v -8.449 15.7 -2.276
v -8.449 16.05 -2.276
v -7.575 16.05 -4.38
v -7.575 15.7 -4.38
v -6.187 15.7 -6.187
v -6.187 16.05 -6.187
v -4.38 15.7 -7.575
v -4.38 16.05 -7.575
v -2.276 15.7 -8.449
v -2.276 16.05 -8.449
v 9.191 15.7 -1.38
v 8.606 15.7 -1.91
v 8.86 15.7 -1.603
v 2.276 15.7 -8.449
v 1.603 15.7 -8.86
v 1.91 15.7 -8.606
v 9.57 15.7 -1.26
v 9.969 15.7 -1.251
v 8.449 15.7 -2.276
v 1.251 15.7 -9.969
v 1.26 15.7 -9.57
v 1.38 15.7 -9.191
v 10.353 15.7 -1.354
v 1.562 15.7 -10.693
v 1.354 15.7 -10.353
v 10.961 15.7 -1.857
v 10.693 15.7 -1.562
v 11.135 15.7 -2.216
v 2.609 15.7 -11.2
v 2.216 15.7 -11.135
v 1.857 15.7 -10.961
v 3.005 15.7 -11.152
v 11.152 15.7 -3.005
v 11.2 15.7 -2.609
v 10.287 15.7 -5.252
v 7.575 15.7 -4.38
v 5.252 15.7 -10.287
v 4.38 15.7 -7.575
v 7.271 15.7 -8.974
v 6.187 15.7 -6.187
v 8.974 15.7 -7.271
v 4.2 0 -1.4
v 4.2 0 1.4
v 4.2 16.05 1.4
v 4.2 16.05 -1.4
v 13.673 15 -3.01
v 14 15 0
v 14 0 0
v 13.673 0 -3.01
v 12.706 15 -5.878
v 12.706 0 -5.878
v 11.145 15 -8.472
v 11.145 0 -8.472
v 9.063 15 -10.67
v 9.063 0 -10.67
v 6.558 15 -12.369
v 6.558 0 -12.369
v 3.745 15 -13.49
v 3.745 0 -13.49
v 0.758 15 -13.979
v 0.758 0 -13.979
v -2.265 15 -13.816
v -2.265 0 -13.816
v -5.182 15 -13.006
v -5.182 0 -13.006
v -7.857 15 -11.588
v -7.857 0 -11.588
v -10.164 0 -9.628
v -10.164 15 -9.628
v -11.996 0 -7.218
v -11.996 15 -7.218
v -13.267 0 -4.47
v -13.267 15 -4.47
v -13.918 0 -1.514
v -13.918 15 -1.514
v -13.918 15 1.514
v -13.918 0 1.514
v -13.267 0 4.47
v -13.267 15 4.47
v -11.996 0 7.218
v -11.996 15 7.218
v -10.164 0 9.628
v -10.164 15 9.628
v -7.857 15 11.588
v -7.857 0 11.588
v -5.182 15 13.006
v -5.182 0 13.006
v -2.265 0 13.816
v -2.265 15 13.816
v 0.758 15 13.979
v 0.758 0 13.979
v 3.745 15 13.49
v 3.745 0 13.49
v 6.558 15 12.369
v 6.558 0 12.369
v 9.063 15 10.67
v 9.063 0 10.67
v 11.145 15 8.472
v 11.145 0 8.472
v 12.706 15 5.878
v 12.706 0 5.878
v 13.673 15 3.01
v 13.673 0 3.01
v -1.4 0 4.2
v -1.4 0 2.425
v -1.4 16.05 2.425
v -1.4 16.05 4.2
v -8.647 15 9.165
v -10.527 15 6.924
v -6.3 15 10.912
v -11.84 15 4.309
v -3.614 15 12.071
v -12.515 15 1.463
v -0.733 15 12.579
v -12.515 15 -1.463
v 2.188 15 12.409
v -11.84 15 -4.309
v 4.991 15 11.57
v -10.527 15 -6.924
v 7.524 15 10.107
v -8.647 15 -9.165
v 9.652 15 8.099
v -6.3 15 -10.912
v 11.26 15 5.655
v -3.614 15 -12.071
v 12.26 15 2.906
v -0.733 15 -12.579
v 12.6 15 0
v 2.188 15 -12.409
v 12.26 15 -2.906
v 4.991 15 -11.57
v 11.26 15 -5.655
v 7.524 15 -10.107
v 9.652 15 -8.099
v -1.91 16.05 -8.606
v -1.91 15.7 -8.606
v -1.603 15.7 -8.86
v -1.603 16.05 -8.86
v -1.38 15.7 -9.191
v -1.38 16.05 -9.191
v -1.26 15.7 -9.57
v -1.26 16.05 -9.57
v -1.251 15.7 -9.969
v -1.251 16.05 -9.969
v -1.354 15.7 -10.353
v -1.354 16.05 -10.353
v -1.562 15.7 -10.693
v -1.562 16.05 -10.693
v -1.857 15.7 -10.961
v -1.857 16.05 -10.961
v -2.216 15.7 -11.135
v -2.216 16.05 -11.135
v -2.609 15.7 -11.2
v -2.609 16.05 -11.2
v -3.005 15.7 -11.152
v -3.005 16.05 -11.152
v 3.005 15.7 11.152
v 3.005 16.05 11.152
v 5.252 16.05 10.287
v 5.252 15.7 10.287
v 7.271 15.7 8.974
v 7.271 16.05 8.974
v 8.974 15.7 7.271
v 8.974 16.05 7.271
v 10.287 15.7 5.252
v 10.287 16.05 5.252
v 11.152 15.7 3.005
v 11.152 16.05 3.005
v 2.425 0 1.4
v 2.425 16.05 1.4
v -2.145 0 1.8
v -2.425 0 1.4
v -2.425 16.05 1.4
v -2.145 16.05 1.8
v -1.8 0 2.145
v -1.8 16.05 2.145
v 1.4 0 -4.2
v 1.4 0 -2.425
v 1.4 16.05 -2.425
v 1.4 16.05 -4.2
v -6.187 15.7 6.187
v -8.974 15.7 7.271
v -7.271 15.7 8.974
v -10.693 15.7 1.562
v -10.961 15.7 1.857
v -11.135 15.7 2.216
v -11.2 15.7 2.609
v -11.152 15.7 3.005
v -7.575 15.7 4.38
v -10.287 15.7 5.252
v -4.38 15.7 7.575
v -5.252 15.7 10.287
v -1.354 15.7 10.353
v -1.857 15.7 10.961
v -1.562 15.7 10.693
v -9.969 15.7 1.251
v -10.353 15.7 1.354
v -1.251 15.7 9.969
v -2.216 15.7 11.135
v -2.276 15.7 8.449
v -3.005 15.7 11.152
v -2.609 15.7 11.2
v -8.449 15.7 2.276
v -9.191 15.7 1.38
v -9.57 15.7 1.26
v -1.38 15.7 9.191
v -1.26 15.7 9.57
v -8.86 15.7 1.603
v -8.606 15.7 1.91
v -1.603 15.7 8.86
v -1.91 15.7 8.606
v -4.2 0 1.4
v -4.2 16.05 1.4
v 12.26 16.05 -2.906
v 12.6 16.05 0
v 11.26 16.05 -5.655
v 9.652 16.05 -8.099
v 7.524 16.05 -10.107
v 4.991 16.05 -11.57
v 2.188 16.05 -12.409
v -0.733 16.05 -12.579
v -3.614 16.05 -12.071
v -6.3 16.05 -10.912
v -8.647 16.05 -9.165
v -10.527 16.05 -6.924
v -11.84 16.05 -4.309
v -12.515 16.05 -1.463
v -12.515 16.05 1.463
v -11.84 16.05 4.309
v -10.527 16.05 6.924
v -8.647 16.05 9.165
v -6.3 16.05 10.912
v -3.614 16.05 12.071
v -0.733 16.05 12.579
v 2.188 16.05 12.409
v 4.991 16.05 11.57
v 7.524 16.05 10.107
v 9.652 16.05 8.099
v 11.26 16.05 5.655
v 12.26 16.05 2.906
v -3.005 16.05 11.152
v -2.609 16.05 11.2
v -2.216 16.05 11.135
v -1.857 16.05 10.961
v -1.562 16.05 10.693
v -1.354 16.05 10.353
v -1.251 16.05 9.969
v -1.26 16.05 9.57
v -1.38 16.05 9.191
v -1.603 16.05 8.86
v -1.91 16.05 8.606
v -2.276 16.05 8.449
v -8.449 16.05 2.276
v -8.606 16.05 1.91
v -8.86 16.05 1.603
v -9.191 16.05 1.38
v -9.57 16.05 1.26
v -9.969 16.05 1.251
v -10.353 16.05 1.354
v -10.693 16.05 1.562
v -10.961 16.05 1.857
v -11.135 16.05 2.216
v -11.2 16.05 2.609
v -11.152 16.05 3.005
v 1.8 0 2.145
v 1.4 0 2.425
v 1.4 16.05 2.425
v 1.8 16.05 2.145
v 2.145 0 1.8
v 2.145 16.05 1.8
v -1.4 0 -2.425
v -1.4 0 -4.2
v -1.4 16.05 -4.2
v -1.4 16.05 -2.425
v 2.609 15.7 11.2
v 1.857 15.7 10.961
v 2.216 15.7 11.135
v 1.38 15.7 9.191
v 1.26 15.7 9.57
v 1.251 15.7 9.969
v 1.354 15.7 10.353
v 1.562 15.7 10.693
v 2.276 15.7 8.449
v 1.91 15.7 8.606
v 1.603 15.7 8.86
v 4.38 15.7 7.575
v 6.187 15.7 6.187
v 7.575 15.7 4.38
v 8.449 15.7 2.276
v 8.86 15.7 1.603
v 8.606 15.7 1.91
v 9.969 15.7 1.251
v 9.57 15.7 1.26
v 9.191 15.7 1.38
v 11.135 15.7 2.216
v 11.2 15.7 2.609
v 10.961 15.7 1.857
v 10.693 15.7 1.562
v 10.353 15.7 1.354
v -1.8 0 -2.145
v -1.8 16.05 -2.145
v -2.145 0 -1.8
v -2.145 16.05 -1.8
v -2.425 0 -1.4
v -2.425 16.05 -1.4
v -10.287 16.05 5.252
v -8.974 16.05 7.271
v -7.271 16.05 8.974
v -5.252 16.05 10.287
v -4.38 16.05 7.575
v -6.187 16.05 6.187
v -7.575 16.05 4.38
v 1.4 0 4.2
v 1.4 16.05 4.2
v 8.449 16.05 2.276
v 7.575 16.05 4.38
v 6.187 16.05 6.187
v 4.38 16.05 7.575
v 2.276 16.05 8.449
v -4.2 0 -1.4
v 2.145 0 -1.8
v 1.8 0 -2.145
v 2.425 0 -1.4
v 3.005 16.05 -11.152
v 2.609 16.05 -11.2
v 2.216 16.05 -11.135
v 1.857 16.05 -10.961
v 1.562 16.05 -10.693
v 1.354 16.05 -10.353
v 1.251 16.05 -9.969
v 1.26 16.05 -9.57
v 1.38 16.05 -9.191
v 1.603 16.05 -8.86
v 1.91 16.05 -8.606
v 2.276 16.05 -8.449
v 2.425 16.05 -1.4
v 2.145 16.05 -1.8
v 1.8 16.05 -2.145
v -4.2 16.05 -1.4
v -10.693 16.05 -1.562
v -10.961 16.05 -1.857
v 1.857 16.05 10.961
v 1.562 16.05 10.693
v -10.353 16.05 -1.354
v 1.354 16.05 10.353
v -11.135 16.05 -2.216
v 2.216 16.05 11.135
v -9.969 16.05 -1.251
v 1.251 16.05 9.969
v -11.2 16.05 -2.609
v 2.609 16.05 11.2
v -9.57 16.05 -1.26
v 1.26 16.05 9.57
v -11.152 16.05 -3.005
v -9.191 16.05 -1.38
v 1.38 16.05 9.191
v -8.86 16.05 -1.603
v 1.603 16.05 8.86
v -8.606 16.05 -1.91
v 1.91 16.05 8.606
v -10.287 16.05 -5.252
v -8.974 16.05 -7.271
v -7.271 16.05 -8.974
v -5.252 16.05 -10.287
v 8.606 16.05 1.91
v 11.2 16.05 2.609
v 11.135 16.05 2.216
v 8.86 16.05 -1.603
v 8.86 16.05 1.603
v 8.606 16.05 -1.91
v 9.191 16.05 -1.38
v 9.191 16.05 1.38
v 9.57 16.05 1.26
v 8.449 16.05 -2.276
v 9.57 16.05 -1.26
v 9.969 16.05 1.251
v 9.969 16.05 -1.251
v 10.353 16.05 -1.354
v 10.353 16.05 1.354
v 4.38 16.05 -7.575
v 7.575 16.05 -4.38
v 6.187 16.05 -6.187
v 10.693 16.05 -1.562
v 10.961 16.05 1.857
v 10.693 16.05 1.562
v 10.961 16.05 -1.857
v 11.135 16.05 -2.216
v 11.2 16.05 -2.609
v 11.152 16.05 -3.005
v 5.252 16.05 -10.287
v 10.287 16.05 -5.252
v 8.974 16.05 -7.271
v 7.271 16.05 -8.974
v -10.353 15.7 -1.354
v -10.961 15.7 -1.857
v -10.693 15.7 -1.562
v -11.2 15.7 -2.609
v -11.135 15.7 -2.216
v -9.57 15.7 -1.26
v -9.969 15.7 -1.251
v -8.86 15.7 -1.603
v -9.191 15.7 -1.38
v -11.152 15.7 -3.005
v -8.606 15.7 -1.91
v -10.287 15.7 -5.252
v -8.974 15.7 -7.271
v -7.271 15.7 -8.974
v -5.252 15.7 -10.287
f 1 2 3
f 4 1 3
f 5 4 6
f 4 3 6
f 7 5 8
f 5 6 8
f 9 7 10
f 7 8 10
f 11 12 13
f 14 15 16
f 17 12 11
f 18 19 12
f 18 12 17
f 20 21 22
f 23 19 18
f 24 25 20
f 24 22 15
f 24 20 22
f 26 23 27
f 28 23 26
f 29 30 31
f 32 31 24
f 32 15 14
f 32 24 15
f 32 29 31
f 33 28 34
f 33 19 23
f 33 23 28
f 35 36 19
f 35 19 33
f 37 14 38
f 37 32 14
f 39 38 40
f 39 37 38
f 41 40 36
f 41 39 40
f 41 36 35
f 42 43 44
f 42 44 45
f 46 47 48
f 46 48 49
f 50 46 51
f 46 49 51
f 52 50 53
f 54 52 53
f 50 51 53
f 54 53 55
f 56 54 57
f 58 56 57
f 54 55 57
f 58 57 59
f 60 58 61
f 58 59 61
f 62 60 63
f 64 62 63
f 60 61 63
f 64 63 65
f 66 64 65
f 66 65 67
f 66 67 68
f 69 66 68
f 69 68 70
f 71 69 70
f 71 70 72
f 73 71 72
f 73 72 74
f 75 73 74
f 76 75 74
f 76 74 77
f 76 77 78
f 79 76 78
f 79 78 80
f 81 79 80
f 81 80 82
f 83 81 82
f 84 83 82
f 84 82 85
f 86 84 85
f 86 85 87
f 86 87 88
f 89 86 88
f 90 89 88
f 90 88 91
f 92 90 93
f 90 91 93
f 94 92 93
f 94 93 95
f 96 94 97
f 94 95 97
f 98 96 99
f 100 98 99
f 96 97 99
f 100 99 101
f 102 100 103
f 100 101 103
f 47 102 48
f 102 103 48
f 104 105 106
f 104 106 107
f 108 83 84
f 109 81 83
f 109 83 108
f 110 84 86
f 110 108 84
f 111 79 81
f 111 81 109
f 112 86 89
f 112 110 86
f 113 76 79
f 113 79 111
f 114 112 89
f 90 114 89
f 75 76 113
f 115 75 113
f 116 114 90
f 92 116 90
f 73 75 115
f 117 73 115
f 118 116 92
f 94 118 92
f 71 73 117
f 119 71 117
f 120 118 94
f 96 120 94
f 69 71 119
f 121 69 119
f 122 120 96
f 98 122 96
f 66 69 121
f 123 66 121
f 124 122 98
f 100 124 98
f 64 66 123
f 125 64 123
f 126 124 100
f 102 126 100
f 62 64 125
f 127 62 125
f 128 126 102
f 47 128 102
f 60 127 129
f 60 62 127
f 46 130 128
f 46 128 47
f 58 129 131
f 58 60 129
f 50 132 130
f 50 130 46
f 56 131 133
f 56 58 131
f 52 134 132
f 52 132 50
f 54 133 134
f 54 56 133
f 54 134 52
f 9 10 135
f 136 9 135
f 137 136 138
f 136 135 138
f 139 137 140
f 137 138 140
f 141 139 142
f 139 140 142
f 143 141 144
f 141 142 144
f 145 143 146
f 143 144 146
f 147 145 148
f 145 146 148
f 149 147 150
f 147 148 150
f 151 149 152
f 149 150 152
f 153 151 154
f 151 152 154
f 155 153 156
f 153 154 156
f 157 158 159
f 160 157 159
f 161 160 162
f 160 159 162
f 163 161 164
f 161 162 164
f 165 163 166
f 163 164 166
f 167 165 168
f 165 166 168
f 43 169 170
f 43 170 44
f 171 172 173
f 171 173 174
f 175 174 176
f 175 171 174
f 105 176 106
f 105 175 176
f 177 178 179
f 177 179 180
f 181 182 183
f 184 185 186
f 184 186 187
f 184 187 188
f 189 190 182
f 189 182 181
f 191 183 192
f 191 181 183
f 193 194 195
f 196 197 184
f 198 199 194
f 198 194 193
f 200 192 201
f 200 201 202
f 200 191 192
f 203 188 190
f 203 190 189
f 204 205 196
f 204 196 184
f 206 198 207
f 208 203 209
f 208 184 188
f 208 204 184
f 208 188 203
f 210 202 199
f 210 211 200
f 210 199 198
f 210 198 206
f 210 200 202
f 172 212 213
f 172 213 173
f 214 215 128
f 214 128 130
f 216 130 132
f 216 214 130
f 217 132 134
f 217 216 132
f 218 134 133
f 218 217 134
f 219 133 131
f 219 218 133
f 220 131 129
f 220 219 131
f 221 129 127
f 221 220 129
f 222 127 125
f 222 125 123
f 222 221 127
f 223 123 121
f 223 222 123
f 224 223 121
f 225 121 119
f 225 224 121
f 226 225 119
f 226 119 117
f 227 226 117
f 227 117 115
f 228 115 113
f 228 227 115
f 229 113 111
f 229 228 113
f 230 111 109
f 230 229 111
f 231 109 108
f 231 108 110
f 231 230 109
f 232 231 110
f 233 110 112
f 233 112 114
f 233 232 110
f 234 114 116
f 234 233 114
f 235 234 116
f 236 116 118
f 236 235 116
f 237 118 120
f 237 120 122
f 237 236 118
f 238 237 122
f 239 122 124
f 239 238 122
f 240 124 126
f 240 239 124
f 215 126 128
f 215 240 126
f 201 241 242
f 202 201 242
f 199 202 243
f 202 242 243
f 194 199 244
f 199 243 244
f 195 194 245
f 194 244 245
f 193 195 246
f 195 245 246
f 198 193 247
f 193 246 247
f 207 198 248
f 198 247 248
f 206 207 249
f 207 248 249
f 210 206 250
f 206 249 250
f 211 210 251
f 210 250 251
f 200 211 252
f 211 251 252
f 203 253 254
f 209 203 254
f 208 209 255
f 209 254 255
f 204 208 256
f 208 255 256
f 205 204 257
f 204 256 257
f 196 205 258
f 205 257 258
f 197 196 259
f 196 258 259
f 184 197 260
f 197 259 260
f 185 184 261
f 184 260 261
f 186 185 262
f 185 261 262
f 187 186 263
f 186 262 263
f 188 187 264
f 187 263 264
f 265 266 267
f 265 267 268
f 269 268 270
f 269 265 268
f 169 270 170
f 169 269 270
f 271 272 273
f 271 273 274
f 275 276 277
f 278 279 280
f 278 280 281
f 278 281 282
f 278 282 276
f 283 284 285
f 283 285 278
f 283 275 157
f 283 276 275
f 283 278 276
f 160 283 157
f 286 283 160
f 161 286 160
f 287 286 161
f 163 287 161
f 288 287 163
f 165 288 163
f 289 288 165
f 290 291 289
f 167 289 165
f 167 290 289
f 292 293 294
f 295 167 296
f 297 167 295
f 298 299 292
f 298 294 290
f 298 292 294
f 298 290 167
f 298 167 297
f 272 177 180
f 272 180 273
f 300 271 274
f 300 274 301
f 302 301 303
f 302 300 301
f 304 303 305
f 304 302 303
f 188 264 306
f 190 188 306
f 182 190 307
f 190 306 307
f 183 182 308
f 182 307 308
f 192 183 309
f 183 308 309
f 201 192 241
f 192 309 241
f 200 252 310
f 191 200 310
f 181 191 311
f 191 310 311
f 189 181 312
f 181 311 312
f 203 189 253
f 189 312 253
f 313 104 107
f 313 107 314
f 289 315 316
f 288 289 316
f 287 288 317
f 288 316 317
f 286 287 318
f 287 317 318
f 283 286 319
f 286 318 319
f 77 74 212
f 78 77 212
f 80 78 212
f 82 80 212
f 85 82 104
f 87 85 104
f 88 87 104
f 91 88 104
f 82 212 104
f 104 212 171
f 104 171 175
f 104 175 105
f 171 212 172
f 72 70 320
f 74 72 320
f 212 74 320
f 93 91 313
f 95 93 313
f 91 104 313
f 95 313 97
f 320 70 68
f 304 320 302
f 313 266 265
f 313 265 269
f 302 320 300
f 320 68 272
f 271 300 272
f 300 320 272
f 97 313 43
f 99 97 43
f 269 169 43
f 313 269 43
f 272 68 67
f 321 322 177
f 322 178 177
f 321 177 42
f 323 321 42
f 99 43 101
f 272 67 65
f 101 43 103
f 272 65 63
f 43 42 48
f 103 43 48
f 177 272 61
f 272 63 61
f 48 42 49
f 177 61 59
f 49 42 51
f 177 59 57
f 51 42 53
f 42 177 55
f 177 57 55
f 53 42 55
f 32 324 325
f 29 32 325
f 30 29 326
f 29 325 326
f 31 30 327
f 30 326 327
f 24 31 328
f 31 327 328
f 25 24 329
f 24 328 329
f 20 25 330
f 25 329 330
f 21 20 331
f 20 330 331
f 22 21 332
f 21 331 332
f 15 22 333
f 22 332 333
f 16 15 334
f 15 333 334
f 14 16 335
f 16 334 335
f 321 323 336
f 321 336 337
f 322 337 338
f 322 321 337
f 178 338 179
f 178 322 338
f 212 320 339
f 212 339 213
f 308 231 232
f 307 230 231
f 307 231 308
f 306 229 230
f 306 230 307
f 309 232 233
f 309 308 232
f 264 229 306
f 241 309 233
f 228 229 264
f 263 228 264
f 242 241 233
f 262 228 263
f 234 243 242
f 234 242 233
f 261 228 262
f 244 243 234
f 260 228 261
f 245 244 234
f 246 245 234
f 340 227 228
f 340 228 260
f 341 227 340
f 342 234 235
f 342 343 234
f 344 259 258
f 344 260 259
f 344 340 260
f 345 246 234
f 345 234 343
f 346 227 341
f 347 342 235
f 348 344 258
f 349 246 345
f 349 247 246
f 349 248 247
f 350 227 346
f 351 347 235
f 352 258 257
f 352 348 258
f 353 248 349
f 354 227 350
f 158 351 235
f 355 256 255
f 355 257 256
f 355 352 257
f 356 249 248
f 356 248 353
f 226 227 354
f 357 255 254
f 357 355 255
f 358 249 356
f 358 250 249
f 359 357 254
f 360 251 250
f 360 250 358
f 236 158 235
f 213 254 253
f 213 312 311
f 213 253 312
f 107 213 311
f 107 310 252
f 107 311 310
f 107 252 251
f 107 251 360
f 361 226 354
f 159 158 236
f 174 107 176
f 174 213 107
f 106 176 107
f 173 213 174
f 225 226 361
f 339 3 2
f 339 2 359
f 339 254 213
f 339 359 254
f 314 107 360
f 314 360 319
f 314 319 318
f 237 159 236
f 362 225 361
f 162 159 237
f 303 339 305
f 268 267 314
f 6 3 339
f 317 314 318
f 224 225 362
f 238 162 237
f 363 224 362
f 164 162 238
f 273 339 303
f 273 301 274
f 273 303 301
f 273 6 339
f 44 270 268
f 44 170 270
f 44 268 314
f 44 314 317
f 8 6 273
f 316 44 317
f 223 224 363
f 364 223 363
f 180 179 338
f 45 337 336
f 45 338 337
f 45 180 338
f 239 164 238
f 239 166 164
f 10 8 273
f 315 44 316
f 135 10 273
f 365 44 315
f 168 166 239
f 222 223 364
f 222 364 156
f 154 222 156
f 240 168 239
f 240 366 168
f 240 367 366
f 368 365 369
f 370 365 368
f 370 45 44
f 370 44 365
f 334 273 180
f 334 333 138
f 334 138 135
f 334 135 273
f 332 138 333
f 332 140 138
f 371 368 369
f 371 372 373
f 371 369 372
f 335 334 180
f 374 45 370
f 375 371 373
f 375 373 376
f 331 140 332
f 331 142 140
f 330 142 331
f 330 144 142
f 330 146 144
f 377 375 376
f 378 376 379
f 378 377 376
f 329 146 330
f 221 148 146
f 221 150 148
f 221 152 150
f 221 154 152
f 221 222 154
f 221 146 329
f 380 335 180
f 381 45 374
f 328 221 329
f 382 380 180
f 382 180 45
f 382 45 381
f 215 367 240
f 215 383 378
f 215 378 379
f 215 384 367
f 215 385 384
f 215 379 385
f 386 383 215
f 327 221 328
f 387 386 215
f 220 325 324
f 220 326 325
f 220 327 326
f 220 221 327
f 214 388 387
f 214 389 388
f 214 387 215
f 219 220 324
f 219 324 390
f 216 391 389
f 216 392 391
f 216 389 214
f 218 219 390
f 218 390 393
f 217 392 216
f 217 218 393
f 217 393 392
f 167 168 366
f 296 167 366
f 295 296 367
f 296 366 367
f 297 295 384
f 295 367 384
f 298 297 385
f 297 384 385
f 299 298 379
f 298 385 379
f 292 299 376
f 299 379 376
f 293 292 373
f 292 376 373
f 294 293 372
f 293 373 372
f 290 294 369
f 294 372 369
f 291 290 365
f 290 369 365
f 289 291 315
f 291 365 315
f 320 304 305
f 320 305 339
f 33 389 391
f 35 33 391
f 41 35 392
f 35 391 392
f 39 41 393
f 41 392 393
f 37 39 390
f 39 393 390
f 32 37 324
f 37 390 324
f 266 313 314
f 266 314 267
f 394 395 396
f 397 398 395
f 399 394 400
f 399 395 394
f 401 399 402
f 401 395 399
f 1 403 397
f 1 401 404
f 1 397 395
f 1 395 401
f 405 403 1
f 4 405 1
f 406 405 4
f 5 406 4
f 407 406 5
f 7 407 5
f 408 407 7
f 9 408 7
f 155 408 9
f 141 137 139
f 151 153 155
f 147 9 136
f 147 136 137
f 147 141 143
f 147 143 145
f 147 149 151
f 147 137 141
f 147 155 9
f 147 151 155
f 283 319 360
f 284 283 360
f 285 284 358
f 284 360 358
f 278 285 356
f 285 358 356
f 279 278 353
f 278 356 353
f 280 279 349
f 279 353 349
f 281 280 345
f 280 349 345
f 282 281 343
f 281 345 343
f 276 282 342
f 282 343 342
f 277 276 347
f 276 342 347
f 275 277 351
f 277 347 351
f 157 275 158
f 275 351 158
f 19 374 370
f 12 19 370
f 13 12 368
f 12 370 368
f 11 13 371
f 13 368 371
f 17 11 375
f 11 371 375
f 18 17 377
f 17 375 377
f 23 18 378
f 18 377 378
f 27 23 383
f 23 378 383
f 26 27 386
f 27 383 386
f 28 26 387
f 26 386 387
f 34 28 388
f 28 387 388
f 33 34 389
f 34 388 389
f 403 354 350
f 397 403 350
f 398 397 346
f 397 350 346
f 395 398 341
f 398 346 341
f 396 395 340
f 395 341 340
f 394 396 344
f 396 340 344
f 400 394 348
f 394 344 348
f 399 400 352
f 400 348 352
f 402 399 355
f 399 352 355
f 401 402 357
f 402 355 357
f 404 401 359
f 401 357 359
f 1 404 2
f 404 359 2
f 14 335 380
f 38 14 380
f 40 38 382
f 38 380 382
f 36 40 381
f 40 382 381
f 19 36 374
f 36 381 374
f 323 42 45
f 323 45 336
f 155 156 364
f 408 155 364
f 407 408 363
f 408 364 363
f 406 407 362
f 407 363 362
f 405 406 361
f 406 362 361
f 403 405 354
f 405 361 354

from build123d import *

# Parameters (mm, degrees)
SKETCH1_R           = 14
BOSS_EXTRUDE2_DEPTH = 16.05
CUT_EXTRUDE1_START  = -1.05
SKETCH3_R           = 14
SKETCH3_R_2         = 12.6
CUT_EXTRUDE1_DEPTH  = 1.05
CUT_EXTRUDE2_DEPTH  = 0.35


with BuildPart() as part:
    # Sketch1 → Boss-Extrude2 (new body)
    with BuildSketch(Plane(origin=(0, 0, 0), x_dir=(1, 0, 0), z_dir=(0, 1, 0))):
        Circle(SKETCH1_R)
        with BuildLine():
            Line((-1.4, 4.2), (-1.4, 2.424871131))
            ThreePointArc((-1.4, 2.424871131), (-1.979898987, 1.979898987), (-2.424871131, 1.4))
            Line((-2.424871131, 1.4), (-4.2, 1.4))
            Line((-4.2, 1.4), (-4.2, -1.4))
            Line((-4.2, -1.4), (-2.424871131, -1.4))
            ThreePointArc((-2.424871131, -1.4), (-1.979898987, -1.979898987), (-1.4, -2.424871131))
            Line((-1.4, -2.424871131), (-1.4, -4.2))
            Line((-1.4, -4.2), (1.4, -4.2))
            Line((1.4, -4.2), (1.4, -2.424871131))
            ThreePointArc((1.4, -2.424871131), (1.979898987, -1.979898987), (2.424871131, -1.4))
            Line((2.424871131, -1.4), (4.2, -1.4))
            Line((4.2, -1.4), (4.2, 1.4))
            Line((4.2, 1.4), (2.424871131, 1.4))
            ThreePointArc((2.424871131, 1.4), (1.979898987, 1.979898987), (1.4, 2.424871131))
            Line((1.4, 2.424871131), (1.4, 4.2))
            Line((1.4, 4.2), (-1.4, 4.2))
        make_face(mode=Mode.SUBTRACT)
    extrude(amount=BOSS_EXTRUDE2_DEPTH)

    # Sketch3 → Cut-Extrude1 (cut)
    with BuildSketch(Plane(origin=(0, 16.05, 0), x_dir=(1, 0, 0), z_dir=(0, 1, 0)).offset(CUT_EXTRUDE1_START)):
        Circle(SKETCH3_R)
        Circle(SKETCH3_R_2, mode=Mode.SUBTRACT)
    extrude(amount=CUT_EXTRUDE1_DEPTH, mode=Mode.SUBTRACT)

    # Sketch3<3> → Cut-Extrude2 (cut)
    with BuildSketch(Plane(origin=(0, 16.05, 0), x_dir=(1, 0, 0), z_dir=(0, 1, 0))):
        with BuildLine():
            ThreePointArc((8.448706113, 2.27637102), (10.164718454, 1.288797405), (11.152292069, 3.004809746))
            ThreePointArc((11.152292069, 3.004809746), (8.167083323, 8.167083323), (3.004809746, 11.152292069))
            ThreePointArc((3.004809746, 11.152292069), (1.288797405, 10.164718454), (2.27637102, 8.448706113))
            ThreePointArc((2.27637102, 8.448706113), (6.187184335, 6.187184335), (8.448706113, 2.27637102))
        make_face()
        with BuildLine():
            ThreePointArc((2.27637102, -8.448706113), (1.288797405, -10.164718454), (3.004809746, -11.152292069))
            ThreePointArc((3.004809746, -11.152292069), (8.167083323, -8.167083323), (11.152292069, -3.004809746))
            ThreePointArc((11.152292069, -3.004809746), (10.164718454, -1.288797405), (8.448706113, -2.27637102))
            ThreePointArc((8.448706113, -2.27637102), (6.187184335, -6.187184335), (2.27637102, -8.448706113))
        make_face()
        with BuildLine():
            ThreePointArc((-8.448706113, -2.27637102), (-10.164718454, -1.288797405), (-11.152292069, -3.004809746))
            ThreePointArc((-11.152292069, -3.004809746), (-8.167083323, -8.167083323), (-3.004809746, -11.152292069))
            ThreePointArc((-3.004809746, -11.152292069), (-1.288797405, -10.164718454), (-2.27637102, -8.448706113))
            ThreePointArc((-2.27637102, -8.448706113), (-6.187184335, -6.187184335), (-8.448706113, -2.27637102))
        make_face()
        with BuildLine():
            ThreePointArc((-2.27637102, 8.448706113), (-1.288797405, 10.164718454), (-3.004809746, 11.152292069))
            ThreePointArc((-3.004809746, 11.152292069), (-8.167083323, 8.167083323), (-11.152292069, 3.004809746))
            ThreePointArc((-11.152292069, 3.004809746), (-10.164718454, 1.288797405), (-8.448706113, 2.27637102))
            ThreePointArc((-8.448706113, 2.27637102), (-6.187184335, 6.187184335), (-2.27637102, 8.448706113))
        make_face()
    extrude(amount=-CUT_EXTRUDE2_DEPTH, mode=Mode.SUBTRACT)


solid = part.part
